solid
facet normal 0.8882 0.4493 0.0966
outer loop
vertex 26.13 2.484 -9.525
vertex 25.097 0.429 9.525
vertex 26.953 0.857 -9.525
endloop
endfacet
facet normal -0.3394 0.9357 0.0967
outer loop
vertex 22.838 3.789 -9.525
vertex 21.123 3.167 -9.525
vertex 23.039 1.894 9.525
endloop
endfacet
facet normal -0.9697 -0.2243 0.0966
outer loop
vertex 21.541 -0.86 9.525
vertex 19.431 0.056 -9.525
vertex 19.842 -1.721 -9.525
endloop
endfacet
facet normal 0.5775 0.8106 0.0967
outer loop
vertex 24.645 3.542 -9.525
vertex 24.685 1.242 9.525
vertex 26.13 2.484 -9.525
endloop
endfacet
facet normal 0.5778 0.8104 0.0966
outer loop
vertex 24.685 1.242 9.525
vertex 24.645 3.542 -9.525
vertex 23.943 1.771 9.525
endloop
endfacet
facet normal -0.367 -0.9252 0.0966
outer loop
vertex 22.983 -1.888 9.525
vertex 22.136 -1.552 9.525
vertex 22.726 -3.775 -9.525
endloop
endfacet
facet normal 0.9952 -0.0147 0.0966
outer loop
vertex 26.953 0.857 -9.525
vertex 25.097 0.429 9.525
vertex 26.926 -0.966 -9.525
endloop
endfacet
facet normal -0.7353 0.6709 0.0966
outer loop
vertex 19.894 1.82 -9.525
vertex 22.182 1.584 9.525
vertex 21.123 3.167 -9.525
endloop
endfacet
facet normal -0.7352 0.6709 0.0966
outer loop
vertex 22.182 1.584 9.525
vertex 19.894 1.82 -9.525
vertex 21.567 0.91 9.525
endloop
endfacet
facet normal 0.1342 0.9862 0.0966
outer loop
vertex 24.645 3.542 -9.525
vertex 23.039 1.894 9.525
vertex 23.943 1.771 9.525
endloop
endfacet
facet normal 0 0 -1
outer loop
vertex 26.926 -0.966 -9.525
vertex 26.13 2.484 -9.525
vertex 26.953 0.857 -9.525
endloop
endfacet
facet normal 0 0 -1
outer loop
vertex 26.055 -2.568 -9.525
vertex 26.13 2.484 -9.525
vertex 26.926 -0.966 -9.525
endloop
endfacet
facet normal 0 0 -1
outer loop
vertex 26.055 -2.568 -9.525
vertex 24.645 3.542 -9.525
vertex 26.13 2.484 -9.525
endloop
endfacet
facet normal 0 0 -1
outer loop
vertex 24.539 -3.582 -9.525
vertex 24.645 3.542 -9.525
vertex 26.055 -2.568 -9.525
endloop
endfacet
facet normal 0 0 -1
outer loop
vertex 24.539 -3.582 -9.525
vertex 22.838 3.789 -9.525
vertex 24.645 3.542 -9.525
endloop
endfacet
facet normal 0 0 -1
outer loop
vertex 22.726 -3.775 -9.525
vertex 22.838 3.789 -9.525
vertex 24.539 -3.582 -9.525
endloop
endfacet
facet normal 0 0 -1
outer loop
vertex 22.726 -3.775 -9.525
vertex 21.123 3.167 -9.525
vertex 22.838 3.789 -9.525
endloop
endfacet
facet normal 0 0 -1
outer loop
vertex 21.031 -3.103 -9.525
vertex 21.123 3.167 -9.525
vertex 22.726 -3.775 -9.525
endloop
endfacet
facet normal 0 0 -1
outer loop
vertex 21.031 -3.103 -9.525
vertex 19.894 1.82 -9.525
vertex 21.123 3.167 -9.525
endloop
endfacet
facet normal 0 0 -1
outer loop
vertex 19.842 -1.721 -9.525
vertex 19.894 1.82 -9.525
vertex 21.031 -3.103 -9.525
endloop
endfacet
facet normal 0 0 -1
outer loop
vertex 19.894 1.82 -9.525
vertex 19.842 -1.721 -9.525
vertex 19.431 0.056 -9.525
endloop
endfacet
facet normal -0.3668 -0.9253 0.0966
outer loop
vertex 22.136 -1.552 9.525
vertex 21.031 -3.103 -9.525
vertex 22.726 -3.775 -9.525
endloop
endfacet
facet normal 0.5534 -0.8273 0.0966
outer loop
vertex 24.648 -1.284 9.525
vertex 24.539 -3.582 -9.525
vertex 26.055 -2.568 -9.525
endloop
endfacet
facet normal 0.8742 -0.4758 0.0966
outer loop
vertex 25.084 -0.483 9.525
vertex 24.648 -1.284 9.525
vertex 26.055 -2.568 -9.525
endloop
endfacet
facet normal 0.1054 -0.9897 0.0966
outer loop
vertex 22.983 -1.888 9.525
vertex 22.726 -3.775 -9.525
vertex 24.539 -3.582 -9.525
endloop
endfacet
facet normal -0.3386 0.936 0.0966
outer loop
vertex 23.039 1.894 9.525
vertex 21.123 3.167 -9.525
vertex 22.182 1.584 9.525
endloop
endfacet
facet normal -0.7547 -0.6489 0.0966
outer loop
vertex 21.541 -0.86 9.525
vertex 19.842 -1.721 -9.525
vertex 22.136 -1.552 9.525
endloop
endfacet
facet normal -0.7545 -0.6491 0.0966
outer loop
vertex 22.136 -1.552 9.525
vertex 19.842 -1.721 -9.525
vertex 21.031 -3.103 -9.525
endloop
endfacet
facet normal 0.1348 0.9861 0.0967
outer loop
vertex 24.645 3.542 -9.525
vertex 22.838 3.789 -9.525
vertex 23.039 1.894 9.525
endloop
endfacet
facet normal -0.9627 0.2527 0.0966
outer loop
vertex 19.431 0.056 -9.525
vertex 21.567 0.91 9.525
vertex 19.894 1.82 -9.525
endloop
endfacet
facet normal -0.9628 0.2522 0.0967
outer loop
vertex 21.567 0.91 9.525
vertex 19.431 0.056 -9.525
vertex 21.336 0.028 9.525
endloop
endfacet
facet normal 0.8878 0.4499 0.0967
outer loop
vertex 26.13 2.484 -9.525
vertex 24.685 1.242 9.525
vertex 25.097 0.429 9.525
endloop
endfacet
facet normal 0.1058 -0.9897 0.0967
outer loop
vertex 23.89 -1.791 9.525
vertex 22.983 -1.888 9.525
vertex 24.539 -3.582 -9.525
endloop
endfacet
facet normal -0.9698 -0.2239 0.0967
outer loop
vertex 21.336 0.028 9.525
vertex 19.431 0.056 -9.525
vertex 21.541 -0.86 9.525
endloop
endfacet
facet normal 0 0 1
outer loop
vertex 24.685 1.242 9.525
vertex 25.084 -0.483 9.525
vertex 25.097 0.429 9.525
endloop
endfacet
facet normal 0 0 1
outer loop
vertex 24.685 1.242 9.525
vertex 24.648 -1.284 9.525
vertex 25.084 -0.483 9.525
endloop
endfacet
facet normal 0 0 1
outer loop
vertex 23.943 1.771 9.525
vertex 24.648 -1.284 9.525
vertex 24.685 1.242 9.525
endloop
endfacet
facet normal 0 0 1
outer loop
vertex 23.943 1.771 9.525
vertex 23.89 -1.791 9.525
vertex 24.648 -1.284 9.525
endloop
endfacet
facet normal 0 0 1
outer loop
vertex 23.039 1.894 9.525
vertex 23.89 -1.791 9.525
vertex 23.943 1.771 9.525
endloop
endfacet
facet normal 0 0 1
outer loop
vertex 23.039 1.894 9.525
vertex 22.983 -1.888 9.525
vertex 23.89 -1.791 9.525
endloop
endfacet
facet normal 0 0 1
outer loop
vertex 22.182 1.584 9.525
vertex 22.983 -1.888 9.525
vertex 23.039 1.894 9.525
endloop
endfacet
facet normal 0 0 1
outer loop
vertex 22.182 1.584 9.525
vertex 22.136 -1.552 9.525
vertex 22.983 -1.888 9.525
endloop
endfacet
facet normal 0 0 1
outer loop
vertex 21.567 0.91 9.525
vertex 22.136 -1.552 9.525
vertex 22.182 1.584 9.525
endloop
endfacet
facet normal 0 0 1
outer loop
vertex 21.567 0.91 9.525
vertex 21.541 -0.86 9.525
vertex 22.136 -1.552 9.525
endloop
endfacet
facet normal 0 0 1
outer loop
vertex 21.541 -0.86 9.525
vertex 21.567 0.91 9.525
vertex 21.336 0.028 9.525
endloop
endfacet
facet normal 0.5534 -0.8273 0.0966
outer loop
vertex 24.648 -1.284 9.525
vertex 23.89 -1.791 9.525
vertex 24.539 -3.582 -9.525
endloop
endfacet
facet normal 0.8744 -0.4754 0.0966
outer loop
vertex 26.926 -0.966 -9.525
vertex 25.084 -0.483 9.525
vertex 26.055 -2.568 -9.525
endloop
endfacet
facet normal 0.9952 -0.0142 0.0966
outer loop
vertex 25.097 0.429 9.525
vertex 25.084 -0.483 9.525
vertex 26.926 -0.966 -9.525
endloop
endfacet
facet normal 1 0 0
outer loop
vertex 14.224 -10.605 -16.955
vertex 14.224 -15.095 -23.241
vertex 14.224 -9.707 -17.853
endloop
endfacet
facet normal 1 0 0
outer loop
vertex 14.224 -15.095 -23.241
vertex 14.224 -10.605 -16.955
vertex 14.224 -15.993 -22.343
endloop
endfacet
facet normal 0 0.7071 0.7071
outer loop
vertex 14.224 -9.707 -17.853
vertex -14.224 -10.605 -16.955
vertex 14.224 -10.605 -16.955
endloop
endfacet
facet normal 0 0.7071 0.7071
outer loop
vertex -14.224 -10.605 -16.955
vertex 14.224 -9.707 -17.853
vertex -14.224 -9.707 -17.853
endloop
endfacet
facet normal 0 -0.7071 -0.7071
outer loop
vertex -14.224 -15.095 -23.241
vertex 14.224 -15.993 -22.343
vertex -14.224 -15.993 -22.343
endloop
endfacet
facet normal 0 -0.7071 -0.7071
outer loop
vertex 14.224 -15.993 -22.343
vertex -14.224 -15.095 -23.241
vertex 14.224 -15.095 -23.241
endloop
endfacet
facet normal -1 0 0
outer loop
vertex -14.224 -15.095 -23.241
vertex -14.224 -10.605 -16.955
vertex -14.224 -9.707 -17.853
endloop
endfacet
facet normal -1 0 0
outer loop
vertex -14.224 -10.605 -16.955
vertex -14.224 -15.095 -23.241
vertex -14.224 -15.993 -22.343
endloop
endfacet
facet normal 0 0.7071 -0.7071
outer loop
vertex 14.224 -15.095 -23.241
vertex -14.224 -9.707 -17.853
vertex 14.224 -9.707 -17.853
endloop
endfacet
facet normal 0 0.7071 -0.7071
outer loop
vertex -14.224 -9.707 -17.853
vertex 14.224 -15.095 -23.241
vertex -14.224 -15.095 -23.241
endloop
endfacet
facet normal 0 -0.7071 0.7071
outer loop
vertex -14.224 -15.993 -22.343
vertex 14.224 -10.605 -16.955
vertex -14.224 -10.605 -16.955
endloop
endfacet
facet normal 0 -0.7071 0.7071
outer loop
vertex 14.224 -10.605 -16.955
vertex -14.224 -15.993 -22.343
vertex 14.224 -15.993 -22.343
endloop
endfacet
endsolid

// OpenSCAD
include <../mo/mo.scad>

blockSize = 0.10 * in;
blockThickness = 0.05 * in;
//sphereRadius = .3 * in;
//sphereOffset = sphereRadius + 7.35 * blockSize;

//sphereRadius = .345 * in;
//sphereOffset = sphereRadius + 6.9 * blockSize;

//sphereRadius = .15 * in;
//sphereOffset = sphereRadius + 8.9 * blockSize;

sphereOffset = 9.15 * blockSize;


//sphereRadius = .25 * in;
//sphereOffset = sphereRadius + 7.9 * blockSize;

mColor = [ 0.9, 0.9, 0.9 ];
punct1Color = [ 0.45, 0.45, 0.45 ];
punct2Color = [ 0.3, 0.3, 0.3 ];

sphereColor = [ 0.8, 0.6, 0.0 ];
//sphereColor = [ 0.9, 0.9, 0.9 ];
//sphereColor = [ 0.5, 0.5, 0.5 ];


// This is a great letter spacing setup  -11.5, -9.5, 3.0, 11.5
//scale( [ 0.5, 1, 1 ] )
//moPose( [ 0, 0, 0 ], t = [ 0 * blockSize, 0, 0 ] ) {
//  color( mColor ) { // [ 1, 1, 1 ] ) {
//    moPose( [ 90, 90, 0 ], [-9.25 * blockSize, 0, 0] )
//      8bit_str( "m", 1, blockSize, blockThickness  );
//  }
//  color( punct1Color ) {
//    moPose( [ 90, 90, 0 ], [-5, 0, 0] )
//      8bit_str( "(", 1, blockSize, blockThickness  );
//    moPose( [ 90, 90, 0 ], [5.0 * blockSize, 0, 0] )
//      8bit_str( ")", 1, blockSize, blockThickness  );
//  }
//  color( punct2Color ) {
//    moPose( [ 90, 90, 0 ], [11.5 * blockSize, 0, 0] )
//      8bit_str( "{", 1, blockSize, blockThickness  );
//    moPose( [ 90, 90, 0 ], [25 * blockSize, 0, 0] )
//      8bit_str( "}", 1, blockSize, blockThickness  );
//  }
//}


module moLogo() {
  moPose( [ 0, 0, 0 ], t = [ 0 * blockSize, 0, -blockSize * 1.75] ) {
    f  = "Liberation Sans:style=Bold";
    color( mColor ) { // [ 1, 1, 1 ] ) {
      moPose( [ 90, 0, 0 ], [-8 * blockSize, 0, -blockSize/2] )
        text( "m", blockSize * 5 , blockThickness, font = f  );
    }
    color( punct1Color ) {
      moPose( [ 90, 0, 0 ], [-4, 0, 0] )
        text( "(", blockSize * 4, blockThickness, font = f  );
      moPose( [ 90, 0, 0 ], [1.0 * blockSize, 0, 0] )
        text( ")", blockSize * 4, blockThickness, font = f  );
    }
    color( punct2Color ) {
      moPose( [ 90, 0, 0 ], [3.5 * blockSize, 0, 0] )
        text( "{", blockSize * 5, blockThickness, font = f  );
      moPose( [ 90, 0, 0 ], [12 * blockSize, 0, 0] )
        text( "}", blockSize * 5, blockThickness, font = f  );
    }
  }
  
  // unless we're going for smooth, $fn more than 16 loses detail as we shrink.  Facets have to be the same size as the
  // features
  
  // $fn's of 5 and 4 look very minecrafty
  
  moPose( [ 0, 0, 13 ], t = [ sphereOffset, 0, 0 ] ) {
   scale( [ 1, 1, 1 ] )
    color( sphereColor ) {
      //sphere( r = sphereRadius, center = true, $fn=13 );
      cylinder( h = 0.75 * in, r1 = 0.15 * in, r2 = 0.075* in, center = true , $fn=13 );
    }    
  }
  
  if ( $name )
    moPartLabel( parent_module( 1 ) );
  
  //  translate( [ 0, 0, -20 * in ] )
  //    color( [ 0, 0, 0 ] )
  //      // cube( [ 500 * in, 500 * in, 0.125 * in ], center = true );
  //      cylinder( h = 1 * in, r = 500 * in );
  //
  //
  //  translate( [ 0, 20 * in ] )
  //    color( [ 0, 0, 0 ] )
  //      moPitch()
  //      // cube( [ 500 * in, 500 * in, 0.125 * in ], center = true );
  //      cylinder( h = 1 * in, r = 500 * in );
  
  
  //
}

moLogo( $name = true );
